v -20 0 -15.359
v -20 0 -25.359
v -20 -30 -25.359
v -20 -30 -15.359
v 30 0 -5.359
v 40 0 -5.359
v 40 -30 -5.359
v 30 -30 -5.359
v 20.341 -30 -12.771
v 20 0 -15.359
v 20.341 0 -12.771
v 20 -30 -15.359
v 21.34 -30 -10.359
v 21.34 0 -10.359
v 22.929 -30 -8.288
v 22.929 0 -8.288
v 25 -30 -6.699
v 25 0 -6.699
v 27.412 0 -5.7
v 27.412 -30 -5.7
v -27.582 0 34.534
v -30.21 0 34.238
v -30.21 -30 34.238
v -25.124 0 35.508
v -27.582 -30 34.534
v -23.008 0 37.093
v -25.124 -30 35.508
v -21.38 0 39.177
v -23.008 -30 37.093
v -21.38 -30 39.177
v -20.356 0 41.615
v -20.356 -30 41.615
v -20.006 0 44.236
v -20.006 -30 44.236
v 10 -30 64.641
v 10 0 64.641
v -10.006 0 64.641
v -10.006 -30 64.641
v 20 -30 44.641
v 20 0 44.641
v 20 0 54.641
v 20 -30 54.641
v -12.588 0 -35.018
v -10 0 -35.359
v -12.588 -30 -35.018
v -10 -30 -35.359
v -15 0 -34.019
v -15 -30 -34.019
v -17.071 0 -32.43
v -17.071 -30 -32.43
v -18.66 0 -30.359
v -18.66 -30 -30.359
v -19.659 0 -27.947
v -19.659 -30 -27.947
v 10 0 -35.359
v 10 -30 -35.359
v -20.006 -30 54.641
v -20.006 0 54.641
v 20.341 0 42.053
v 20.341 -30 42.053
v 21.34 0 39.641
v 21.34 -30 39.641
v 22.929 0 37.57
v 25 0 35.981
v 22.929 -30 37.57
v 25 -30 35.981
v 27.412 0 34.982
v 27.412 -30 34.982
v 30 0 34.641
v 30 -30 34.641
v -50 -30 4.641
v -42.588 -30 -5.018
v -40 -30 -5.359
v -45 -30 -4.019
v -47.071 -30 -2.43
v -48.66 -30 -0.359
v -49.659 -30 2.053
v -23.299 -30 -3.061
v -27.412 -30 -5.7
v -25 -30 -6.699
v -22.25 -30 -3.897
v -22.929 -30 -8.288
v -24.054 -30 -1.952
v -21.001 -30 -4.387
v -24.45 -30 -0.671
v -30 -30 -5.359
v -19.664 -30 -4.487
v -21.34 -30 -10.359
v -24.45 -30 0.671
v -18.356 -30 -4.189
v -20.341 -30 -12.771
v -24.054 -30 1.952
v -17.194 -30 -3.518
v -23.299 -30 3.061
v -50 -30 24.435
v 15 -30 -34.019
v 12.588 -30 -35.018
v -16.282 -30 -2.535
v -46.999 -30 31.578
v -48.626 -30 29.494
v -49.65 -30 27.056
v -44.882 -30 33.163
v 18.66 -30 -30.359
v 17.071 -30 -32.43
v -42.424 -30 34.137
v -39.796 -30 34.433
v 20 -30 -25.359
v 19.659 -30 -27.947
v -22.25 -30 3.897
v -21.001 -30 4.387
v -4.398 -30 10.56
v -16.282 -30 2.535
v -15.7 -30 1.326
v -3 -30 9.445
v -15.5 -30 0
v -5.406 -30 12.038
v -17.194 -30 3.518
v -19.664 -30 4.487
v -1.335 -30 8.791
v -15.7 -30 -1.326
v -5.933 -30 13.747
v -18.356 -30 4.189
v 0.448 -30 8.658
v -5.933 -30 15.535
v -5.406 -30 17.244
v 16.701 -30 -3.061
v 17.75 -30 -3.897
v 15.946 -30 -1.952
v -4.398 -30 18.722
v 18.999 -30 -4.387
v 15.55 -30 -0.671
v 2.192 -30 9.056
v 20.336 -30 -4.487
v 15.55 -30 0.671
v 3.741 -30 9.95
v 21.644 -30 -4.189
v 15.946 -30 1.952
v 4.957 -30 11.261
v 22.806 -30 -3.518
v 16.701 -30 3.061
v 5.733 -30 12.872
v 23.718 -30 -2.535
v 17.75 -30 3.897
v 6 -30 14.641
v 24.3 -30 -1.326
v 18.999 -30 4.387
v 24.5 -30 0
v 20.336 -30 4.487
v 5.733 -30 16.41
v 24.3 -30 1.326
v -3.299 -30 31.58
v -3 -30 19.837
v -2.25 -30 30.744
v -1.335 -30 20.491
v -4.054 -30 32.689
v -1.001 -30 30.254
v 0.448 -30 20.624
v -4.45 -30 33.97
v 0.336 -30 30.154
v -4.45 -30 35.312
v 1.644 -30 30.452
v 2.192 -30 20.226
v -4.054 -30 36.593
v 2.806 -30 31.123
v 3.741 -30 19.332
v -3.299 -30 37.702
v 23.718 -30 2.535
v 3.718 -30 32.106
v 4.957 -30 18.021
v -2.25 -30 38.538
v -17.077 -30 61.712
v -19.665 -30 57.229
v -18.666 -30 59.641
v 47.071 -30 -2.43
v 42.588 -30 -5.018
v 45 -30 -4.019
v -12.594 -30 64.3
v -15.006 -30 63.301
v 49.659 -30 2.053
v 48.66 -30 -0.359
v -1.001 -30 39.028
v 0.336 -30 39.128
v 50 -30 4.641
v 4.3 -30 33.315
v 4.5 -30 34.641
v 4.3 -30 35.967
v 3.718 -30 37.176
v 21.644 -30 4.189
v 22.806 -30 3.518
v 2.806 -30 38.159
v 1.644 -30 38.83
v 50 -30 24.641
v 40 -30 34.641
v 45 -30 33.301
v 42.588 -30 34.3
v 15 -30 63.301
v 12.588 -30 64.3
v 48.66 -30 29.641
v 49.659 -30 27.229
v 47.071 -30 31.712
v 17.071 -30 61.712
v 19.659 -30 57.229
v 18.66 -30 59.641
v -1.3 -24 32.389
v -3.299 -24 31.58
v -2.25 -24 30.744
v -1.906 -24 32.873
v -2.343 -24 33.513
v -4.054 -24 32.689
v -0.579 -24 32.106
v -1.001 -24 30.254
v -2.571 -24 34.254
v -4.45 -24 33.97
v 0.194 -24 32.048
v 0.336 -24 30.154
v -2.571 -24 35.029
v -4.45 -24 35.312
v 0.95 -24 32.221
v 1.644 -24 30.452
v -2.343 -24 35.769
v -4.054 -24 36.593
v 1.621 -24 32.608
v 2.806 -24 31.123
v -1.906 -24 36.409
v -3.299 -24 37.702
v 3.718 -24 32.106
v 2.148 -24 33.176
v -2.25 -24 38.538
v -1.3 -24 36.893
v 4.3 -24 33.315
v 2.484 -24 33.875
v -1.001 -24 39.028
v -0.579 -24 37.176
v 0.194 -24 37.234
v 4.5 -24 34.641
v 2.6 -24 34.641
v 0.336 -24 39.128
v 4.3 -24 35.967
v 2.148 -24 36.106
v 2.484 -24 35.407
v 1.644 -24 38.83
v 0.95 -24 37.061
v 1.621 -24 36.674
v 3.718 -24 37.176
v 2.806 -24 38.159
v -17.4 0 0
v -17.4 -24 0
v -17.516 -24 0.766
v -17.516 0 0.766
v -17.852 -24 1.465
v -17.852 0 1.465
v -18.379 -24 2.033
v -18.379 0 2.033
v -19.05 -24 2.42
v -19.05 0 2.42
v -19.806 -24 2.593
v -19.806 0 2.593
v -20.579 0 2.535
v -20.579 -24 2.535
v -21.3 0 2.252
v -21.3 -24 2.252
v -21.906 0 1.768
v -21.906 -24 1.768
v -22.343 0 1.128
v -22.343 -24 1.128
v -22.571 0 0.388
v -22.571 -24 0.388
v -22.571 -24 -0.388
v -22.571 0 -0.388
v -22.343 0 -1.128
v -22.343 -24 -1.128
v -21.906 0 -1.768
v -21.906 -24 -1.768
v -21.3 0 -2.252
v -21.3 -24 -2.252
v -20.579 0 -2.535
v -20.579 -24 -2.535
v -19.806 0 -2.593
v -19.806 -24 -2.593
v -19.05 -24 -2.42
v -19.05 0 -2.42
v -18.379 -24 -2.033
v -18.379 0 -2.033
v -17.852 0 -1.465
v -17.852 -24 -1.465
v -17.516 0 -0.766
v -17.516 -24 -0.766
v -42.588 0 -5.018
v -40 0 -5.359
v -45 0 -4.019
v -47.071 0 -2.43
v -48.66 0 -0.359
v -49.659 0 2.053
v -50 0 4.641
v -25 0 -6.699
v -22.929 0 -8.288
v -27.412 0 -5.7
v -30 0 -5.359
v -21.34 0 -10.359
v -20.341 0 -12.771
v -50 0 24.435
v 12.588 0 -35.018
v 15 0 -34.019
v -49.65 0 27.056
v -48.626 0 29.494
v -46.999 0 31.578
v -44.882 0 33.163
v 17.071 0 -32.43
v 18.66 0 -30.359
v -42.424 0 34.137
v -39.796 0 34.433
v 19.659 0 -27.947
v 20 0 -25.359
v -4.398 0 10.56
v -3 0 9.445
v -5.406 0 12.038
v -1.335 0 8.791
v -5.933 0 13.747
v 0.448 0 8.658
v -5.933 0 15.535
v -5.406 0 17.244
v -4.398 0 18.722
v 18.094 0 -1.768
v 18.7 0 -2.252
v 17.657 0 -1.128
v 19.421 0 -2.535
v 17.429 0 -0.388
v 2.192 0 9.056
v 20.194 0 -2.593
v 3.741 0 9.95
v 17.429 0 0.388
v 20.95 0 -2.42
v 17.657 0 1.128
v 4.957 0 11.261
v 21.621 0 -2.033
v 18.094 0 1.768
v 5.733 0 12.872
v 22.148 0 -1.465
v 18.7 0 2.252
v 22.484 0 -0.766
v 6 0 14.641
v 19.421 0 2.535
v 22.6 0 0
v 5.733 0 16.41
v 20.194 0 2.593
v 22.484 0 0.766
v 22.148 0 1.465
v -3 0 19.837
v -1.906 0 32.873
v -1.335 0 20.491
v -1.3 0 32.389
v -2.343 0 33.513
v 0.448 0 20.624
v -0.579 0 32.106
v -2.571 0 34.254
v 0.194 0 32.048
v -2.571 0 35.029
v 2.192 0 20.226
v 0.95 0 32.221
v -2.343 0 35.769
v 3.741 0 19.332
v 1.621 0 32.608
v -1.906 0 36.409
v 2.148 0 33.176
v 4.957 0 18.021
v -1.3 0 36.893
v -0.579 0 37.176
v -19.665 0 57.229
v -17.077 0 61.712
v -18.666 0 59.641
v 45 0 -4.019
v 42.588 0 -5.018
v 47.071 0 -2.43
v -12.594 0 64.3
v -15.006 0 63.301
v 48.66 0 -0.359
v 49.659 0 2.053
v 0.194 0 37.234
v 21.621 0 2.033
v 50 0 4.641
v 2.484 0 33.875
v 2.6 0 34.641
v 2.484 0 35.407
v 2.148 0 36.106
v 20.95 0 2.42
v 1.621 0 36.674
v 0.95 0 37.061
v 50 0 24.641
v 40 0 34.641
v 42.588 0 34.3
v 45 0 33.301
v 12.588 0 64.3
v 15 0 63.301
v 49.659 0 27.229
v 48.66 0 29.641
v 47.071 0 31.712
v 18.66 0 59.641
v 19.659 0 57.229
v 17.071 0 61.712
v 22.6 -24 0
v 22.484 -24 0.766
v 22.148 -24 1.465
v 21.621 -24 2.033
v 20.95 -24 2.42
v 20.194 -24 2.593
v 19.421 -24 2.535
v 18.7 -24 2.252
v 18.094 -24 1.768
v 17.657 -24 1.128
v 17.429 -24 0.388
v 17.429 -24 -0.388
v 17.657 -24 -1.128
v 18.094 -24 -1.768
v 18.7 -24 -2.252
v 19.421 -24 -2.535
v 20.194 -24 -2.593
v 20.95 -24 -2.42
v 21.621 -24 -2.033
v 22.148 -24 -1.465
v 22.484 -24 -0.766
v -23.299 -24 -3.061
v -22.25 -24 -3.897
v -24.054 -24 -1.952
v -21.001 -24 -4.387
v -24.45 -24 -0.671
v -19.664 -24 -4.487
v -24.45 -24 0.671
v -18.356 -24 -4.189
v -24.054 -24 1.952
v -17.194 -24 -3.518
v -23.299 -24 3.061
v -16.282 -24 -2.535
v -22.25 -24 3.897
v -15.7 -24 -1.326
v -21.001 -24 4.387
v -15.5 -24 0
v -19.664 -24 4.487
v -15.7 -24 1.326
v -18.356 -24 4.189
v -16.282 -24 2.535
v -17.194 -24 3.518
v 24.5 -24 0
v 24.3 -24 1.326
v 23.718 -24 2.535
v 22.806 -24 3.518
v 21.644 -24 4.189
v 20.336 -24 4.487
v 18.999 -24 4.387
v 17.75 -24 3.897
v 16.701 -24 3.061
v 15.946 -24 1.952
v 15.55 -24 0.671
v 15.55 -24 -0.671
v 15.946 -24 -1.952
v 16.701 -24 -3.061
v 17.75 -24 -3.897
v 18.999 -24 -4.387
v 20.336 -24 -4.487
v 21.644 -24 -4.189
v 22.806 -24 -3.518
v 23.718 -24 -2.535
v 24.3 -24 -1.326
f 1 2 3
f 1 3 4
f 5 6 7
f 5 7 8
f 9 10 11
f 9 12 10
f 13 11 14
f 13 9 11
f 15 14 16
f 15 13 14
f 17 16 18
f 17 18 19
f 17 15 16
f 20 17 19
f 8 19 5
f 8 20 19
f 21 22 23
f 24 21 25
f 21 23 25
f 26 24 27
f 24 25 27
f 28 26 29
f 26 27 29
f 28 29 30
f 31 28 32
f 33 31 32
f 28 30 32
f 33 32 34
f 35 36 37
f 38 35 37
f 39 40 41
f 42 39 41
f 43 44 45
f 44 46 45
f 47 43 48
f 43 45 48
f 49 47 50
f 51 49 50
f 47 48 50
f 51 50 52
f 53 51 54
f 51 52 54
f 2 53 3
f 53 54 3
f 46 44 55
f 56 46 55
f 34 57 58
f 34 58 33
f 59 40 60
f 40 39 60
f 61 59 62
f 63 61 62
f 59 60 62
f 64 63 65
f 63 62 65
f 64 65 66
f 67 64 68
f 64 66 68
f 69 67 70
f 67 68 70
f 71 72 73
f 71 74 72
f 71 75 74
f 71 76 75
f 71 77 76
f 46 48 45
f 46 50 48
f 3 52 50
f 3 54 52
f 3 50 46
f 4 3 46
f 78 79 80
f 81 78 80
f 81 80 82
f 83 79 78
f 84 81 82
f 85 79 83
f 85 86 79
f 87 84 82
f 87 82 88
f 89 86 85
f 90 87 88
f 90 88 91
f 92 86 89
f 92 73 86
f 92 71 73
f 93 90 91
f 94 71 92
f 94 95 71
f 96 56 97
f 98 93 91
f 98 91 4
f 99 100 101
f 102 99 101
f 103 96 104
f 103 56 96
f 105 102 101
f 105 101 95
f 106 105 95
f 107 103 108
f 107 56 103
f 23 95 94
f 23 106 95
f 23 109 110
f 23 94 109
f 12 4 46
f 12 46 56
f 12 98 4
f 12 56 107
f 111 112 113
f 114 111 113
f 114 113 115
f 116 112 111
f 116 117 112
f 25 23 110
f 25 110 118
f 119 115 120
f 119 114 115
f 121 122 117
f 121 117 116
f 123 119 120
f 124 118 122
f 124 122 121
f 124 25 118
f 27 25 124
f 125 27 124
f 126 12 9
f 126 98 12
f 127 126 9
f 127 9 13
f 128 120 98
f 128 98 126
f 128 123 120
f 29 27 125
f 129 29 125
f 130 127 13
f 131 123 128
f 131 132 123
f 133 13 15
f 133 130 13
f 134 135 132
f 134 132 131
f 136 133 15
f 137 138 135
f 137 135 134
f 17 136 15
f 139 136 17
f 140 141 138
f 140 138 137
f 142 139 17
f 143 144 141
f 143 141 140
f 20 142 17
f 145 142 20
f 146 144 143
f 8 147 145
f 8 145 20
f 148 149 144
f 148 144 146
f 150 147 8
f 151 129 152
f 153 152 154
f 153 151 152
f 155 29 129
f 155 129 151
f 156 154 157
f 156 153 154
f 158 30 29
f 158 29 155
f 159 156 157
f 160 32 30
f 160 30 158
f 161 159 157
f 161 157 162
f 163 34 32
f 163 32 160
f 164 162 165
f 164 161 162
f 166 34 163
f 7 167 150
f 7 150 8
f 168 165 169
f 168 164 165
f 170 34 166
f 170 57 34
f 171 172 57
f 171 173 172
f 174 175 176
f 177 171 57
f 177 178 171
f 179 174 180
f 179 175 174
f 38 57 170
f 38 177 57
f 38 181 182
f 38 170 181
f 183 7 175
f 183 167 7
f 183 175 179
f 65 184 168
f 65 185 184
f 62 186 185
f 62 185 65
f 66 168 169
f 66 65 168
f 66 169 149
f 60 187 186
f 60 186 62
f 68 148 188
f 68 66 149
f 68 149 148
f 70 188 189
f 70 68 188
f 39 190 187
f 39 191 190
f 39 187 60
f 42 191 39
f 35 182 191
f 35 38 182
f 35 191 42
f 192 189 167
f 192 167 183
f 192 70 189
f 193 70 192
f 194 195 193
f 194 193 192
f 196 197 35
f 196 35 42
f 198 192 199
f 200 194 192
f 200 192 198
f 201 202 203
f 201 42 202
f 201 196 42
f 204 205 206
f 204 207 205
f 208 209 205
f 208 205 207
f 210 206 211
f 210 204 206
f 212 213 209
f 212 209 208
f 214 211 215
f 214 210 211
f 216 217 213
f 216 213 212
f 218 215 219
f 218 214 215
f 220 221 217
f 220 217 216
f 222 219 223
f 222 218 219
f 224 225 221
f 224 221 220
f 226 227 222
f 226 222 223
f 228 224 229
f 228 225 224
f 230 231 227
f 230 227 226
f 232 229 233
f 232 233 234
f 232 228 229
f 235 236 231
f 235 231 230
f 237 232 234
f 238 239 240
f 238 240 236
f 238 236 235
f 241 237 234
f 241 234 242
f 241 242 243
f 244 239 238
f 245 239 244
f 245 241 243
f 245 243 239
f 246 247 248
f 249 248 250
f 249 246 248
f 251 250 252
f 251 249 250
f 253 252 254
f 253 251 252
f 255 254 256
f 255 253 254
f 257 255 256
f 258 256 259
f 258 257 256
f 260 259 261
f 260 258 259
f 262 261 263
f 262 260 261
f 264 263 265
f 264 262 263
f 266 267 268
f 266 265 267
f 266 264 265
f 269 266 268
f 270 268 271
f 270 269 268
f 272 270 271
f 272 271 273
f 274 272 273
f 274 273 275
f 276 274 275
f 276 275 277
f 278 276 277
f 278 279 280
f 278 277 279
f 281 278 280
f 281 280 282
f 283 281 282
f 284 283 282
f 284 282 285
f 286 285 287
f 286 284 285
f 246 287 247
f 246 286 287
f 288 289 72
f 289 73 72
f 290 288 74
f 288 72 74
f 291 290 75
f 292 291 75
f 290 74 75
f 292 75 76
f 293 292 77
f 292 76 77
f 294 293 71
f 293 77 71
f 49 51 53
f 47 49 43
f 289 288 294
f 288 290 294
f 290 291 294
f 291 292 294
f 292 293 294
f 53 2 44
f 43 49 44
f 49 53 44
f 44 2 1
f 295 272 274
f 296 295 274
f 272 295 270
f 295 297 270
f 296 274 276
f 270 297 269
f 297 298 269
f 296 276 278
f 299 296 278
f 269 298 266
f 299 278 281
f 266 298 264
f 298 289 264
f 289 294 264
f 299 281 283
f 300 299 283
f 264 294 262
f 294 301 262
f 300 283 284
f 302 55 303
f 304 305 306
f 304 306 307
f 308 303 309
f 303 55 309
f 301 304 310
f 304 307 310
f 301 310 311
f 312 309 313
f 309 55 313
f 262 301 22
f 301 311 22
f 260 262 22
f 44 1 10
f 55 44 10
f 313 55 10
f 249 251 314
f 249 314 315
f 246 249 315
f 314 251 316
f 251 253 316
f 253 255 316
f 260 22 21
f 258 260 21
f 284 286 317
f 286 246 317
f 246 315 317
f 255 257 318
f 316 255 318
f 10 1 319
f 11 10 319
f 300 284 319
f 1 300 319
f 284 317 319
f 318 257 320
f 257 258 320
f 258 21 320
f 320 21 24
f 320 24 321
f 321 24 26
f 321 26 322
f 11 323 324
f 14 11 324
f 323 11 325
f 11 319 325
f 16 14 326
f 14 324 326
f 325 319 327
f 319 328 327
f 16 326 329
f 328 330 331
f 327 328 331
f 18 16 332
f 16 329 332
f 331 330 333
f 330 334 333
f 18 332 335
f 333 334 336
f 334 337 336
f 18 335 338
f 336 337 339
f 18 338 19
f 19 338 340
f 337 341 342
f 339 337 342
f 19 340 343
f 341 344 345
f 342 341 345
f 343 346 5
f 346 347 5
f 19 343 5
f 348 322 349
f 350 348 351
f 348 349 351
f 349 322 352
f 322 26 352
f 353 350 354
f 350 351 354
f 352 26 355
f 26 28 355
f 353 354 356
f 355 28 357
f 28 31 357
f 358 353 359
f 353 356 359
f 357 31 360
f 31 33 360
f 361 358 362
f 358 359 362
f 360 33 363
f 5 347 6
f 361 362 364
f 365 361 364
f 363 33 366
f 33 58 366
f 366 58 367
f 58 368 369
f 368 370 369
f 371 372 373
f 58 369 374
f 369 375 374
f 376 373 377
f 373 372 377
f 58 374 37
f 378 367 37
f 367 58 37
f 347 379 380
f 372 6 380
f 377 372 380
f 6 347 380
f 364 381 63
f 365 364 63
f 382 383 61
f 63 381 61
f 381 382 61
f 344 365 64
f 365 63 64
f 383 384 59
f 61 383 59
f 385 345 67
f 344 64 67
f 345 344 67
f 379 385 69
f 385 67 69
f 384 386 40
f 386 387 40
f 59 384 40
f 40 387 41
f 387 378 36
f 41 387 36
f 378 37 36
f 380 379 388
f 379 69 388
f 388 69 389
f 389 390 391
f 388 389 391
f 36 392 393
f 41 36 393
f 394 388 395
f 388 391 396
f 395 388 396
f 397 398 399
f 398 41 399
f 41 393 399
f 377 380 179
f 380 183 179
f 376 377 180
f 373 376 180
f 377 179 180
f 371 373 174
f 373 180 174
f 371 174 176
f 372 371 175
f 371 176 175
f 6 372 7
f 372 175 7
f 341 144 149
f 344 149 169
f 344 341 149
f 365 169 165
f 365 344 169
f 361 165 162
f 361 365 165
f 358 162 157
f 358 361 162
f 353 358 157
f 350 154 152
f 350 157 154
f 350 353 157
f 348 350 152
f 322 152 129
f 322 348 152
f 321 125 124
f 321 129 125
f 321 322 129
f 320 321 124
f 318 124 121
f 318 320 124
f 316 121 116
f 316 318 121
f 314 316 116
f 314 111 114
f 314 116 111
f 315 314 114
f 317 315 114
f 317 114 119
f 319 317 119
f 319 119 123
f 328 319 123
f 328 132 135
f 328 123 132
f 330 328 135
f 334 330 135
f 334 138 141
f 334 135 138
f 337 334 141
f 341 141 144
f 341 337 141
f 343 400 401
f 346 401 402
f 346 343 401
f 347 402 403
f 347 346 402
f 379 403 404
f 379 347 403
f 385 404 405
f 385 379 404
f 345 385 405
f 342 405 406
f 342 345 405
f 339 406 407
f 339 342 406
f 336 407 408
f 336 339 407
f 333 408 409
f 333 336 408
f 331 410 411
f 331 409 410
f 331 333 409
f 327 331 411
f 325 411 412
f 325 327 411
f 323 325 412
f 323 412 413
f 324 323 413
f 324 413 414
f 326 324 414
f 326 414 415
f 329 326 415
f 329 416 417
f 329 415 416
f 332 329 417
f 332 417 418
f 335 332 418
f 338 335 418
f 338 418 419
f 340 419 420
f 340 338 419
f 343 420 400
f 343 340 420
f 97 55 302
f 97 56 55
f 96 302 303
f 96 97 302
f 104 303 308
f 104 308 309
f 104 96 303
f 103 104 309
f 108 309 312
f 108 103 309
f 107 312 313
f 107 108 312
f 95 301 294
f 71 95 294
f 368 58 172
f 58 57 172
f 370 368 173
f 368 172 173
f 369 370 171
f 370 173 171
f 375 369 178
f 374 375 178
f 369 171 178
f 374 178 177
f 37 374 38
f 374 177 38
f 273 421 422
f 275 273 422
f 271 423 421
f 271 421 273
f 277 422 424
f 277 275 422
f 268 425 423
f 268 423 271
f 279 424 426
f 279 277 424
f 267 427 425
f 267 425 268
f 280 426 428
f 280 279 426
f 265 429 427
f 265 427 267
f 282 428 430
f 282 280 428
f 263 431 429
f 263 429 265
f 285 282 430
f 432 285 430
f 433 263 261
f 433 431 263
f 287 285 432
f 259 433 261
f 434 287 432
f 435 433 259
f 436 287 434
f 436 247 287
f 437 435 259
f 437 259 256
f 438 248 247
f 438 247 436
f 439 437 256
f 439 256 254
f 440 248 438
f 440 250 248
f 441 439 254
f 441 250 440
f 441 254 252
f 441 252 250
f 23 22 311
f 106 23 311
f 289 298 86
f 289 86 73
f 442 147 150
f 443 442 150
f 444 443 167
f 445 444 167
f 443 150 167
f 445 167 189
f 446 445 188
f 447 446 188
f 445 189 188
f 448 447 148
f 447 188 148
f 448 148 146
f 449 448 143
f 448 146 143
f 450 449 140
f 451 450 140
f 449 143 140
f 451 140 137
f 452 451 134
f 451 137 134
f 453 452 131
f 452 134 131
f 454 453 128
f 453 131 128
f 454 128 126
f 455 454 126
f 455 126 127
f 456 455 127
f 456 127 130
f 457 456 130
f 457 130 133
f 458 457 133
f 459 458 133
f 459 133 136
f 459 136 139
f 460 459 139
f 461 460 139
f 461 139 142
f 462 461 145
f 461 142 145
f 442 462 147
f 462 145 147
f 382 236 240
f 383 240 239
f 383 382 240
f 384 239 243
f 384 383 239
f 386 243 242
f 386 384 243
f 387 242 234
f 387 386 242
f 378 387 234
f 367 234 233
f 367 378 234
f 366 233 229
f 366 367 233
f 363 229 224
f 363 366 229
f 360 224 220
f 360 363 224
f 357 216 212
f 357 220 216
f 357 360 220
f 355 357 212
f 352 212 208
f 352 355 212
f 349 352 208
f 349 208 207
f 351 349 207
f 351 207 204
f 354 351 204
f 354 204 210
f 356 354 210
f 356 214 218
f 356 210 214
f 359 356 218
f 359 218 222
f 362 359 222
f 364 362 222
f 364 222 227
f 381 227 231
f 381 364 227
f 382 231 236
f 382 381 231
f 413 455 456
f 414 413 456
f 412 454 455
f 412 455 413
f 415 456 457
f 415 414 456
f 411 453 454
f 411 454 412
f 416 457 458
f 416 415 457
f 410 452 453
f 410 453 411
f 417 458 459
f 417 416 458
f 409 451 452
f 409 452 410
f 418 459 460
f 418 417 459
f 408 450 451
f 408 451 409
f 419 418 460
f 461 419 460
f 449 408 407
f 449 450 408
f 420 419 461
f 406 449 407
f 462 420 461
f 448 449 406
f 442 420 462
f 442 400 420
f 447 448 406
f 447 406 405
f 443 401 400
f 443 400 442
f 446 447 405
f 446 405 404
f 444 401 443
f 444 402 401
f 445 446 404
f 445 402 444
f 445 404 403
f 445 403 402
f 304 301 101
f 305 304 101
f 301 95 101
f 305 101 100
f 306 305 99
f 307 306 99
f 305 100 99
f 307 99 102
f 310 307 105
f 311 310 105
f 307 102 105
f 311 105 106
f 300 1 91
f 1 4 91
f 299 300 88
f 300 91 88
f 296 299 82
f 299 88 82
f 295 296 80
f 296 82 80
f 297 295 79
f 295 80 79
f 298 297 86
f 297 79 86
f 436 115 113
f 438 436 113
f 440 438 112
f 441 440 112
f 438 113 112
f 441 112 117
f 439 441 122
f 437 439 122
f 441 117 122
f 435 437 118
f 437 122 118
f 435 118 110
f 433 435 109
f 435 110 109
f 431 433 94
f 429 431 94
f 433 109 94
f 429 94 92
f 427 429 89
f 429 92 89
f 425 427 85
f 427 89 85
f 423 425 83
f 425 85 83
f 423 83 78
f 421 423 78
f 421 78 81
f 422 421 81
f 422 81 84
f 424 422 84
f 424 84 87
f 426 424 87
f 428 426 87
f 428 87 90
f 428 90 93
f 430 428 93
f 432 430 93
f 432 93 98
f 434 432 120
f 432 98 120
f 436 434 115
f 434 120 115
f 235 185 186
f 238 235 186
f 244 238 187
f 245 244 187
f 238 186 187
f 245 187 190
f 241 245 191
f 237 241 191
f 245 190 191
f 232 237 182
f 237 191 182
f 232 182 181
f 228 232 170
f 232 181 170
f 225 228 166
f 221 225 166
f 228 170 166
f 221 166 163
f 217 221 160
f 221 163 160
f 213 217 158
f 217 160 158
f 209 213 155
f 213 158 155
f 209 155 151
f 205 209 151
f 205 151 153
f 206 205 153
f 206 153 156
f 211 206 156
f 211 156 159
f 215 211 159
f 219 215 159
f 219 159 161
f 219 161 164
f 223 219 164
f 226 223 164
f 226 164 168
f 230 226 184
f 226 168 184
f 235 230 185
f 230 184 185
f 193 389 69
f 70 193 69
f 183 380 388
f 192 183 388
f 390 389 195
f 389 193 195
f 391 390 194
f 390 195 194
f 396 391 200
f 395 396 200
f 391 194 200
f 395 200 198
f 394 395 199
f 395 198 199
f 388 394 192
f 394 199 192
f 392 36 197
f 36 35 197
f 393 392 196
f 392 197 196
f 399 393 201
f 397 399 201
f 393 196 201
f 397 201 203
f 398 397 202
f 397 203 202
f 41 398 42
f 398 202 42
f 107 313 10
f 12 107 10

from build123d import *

# Parameters (mm, degrees)
F2_DEPTH = 30
F0_R     = 2.6
F0_R_2   = 6
F3_DEPTH = 50
F4_R     = 4.5
F5_DEPTH = 6
F6_W     = 30
F6_H     = 30
F7_DEPTH = 50
F8_R     = 10


with BuildPart() as f2:
    # F1 (on Front) → F2 (new body)
    with BuildSketch(Plane.XZ):
        Polygon((-50, 4.6410161514), (-50, -35.3589838486), (50, -35.3589838486), (50, 4.6410161514), (50, 24.6410161514), (50, 64.6410161514), (-50, 64.6410161514), (-50, 24.6410161514), align=None)
    extrude(amount=F2_DEPTH)

    # F0 (on Front) → F3 (cut)
    with BuildSketch(Plane.XZ):
        with Locations((0, 34.6410161514)):
            Circle(F0_R)
        with Locations((-20, 0)):
            Circle(F0_R)
        with Locations((20, 0)):
            Circle(F0_R)
        with Locations((0, 14.6410161514)):
            Circle(F0_R_2)
    extrude(amount=F3_DEPTH, mode=Mode.SUBTRACT)

    # F4 (on face) → F5 (cut)
    with BuildSketch(Plane.XZ.offset(30)):
        with Locations((0, 34.6410161514)):
            Circle(F4_R)
        with Locations((20, 0)):
            Circle(F4_R)
        with Locations((-20, 0)):
            Circle(F4_R)
    extrude(amount=-F5_DEPTH, mode=Mode.SUBTRACT)

    # F6 (on face) → F7 (cut)
    with BuildSketch(Plane(origin=(0, 0, 0), x_dir=(-1, 0, 0), z_dir=(0, 1, 0))):
        with Locations((-35, 49.6410161514)):
            Rectangle(F6_W, F6_H)
        with Locations((-35, -20.3589838486)):
            Rectangle(F6_W, F6_H)
        with Locations((35, -20.3589838486)):
            Rectangle(F6_W, F6_H)
        Polygon((50, 64.6410161514), (20.0062222363, 64.6410161514), (20.0062222363, 34.0300370508), (50, 34.6410161514), align=None)
    extrude(amount=-F7_DEPTH, mode=Mode.SUBTRACT)

    # F8
    f8_edges = [f2.edges().sort_by_distance(p)[0] for p in [
        (-20.006222, -15, 64.641016),
        (-20.006222, -15, 34.030037),
        (-50, -15, 34.641016),
        (-50, -15, -5.358984),
        (-20, -15, -5.358984),
        (-20, -15, -35.358984),
        (20, -15, -35.358984),
        (20, -15, -5.358984),
        (50, -15, -5.358984),
        (20, -15, 64.641016),
        (20, -15, 34.641016),
        (50, -15, 34.641016),
    ]]
    fillet(f8_edges, radius=F8_R)


solid = f2.part
